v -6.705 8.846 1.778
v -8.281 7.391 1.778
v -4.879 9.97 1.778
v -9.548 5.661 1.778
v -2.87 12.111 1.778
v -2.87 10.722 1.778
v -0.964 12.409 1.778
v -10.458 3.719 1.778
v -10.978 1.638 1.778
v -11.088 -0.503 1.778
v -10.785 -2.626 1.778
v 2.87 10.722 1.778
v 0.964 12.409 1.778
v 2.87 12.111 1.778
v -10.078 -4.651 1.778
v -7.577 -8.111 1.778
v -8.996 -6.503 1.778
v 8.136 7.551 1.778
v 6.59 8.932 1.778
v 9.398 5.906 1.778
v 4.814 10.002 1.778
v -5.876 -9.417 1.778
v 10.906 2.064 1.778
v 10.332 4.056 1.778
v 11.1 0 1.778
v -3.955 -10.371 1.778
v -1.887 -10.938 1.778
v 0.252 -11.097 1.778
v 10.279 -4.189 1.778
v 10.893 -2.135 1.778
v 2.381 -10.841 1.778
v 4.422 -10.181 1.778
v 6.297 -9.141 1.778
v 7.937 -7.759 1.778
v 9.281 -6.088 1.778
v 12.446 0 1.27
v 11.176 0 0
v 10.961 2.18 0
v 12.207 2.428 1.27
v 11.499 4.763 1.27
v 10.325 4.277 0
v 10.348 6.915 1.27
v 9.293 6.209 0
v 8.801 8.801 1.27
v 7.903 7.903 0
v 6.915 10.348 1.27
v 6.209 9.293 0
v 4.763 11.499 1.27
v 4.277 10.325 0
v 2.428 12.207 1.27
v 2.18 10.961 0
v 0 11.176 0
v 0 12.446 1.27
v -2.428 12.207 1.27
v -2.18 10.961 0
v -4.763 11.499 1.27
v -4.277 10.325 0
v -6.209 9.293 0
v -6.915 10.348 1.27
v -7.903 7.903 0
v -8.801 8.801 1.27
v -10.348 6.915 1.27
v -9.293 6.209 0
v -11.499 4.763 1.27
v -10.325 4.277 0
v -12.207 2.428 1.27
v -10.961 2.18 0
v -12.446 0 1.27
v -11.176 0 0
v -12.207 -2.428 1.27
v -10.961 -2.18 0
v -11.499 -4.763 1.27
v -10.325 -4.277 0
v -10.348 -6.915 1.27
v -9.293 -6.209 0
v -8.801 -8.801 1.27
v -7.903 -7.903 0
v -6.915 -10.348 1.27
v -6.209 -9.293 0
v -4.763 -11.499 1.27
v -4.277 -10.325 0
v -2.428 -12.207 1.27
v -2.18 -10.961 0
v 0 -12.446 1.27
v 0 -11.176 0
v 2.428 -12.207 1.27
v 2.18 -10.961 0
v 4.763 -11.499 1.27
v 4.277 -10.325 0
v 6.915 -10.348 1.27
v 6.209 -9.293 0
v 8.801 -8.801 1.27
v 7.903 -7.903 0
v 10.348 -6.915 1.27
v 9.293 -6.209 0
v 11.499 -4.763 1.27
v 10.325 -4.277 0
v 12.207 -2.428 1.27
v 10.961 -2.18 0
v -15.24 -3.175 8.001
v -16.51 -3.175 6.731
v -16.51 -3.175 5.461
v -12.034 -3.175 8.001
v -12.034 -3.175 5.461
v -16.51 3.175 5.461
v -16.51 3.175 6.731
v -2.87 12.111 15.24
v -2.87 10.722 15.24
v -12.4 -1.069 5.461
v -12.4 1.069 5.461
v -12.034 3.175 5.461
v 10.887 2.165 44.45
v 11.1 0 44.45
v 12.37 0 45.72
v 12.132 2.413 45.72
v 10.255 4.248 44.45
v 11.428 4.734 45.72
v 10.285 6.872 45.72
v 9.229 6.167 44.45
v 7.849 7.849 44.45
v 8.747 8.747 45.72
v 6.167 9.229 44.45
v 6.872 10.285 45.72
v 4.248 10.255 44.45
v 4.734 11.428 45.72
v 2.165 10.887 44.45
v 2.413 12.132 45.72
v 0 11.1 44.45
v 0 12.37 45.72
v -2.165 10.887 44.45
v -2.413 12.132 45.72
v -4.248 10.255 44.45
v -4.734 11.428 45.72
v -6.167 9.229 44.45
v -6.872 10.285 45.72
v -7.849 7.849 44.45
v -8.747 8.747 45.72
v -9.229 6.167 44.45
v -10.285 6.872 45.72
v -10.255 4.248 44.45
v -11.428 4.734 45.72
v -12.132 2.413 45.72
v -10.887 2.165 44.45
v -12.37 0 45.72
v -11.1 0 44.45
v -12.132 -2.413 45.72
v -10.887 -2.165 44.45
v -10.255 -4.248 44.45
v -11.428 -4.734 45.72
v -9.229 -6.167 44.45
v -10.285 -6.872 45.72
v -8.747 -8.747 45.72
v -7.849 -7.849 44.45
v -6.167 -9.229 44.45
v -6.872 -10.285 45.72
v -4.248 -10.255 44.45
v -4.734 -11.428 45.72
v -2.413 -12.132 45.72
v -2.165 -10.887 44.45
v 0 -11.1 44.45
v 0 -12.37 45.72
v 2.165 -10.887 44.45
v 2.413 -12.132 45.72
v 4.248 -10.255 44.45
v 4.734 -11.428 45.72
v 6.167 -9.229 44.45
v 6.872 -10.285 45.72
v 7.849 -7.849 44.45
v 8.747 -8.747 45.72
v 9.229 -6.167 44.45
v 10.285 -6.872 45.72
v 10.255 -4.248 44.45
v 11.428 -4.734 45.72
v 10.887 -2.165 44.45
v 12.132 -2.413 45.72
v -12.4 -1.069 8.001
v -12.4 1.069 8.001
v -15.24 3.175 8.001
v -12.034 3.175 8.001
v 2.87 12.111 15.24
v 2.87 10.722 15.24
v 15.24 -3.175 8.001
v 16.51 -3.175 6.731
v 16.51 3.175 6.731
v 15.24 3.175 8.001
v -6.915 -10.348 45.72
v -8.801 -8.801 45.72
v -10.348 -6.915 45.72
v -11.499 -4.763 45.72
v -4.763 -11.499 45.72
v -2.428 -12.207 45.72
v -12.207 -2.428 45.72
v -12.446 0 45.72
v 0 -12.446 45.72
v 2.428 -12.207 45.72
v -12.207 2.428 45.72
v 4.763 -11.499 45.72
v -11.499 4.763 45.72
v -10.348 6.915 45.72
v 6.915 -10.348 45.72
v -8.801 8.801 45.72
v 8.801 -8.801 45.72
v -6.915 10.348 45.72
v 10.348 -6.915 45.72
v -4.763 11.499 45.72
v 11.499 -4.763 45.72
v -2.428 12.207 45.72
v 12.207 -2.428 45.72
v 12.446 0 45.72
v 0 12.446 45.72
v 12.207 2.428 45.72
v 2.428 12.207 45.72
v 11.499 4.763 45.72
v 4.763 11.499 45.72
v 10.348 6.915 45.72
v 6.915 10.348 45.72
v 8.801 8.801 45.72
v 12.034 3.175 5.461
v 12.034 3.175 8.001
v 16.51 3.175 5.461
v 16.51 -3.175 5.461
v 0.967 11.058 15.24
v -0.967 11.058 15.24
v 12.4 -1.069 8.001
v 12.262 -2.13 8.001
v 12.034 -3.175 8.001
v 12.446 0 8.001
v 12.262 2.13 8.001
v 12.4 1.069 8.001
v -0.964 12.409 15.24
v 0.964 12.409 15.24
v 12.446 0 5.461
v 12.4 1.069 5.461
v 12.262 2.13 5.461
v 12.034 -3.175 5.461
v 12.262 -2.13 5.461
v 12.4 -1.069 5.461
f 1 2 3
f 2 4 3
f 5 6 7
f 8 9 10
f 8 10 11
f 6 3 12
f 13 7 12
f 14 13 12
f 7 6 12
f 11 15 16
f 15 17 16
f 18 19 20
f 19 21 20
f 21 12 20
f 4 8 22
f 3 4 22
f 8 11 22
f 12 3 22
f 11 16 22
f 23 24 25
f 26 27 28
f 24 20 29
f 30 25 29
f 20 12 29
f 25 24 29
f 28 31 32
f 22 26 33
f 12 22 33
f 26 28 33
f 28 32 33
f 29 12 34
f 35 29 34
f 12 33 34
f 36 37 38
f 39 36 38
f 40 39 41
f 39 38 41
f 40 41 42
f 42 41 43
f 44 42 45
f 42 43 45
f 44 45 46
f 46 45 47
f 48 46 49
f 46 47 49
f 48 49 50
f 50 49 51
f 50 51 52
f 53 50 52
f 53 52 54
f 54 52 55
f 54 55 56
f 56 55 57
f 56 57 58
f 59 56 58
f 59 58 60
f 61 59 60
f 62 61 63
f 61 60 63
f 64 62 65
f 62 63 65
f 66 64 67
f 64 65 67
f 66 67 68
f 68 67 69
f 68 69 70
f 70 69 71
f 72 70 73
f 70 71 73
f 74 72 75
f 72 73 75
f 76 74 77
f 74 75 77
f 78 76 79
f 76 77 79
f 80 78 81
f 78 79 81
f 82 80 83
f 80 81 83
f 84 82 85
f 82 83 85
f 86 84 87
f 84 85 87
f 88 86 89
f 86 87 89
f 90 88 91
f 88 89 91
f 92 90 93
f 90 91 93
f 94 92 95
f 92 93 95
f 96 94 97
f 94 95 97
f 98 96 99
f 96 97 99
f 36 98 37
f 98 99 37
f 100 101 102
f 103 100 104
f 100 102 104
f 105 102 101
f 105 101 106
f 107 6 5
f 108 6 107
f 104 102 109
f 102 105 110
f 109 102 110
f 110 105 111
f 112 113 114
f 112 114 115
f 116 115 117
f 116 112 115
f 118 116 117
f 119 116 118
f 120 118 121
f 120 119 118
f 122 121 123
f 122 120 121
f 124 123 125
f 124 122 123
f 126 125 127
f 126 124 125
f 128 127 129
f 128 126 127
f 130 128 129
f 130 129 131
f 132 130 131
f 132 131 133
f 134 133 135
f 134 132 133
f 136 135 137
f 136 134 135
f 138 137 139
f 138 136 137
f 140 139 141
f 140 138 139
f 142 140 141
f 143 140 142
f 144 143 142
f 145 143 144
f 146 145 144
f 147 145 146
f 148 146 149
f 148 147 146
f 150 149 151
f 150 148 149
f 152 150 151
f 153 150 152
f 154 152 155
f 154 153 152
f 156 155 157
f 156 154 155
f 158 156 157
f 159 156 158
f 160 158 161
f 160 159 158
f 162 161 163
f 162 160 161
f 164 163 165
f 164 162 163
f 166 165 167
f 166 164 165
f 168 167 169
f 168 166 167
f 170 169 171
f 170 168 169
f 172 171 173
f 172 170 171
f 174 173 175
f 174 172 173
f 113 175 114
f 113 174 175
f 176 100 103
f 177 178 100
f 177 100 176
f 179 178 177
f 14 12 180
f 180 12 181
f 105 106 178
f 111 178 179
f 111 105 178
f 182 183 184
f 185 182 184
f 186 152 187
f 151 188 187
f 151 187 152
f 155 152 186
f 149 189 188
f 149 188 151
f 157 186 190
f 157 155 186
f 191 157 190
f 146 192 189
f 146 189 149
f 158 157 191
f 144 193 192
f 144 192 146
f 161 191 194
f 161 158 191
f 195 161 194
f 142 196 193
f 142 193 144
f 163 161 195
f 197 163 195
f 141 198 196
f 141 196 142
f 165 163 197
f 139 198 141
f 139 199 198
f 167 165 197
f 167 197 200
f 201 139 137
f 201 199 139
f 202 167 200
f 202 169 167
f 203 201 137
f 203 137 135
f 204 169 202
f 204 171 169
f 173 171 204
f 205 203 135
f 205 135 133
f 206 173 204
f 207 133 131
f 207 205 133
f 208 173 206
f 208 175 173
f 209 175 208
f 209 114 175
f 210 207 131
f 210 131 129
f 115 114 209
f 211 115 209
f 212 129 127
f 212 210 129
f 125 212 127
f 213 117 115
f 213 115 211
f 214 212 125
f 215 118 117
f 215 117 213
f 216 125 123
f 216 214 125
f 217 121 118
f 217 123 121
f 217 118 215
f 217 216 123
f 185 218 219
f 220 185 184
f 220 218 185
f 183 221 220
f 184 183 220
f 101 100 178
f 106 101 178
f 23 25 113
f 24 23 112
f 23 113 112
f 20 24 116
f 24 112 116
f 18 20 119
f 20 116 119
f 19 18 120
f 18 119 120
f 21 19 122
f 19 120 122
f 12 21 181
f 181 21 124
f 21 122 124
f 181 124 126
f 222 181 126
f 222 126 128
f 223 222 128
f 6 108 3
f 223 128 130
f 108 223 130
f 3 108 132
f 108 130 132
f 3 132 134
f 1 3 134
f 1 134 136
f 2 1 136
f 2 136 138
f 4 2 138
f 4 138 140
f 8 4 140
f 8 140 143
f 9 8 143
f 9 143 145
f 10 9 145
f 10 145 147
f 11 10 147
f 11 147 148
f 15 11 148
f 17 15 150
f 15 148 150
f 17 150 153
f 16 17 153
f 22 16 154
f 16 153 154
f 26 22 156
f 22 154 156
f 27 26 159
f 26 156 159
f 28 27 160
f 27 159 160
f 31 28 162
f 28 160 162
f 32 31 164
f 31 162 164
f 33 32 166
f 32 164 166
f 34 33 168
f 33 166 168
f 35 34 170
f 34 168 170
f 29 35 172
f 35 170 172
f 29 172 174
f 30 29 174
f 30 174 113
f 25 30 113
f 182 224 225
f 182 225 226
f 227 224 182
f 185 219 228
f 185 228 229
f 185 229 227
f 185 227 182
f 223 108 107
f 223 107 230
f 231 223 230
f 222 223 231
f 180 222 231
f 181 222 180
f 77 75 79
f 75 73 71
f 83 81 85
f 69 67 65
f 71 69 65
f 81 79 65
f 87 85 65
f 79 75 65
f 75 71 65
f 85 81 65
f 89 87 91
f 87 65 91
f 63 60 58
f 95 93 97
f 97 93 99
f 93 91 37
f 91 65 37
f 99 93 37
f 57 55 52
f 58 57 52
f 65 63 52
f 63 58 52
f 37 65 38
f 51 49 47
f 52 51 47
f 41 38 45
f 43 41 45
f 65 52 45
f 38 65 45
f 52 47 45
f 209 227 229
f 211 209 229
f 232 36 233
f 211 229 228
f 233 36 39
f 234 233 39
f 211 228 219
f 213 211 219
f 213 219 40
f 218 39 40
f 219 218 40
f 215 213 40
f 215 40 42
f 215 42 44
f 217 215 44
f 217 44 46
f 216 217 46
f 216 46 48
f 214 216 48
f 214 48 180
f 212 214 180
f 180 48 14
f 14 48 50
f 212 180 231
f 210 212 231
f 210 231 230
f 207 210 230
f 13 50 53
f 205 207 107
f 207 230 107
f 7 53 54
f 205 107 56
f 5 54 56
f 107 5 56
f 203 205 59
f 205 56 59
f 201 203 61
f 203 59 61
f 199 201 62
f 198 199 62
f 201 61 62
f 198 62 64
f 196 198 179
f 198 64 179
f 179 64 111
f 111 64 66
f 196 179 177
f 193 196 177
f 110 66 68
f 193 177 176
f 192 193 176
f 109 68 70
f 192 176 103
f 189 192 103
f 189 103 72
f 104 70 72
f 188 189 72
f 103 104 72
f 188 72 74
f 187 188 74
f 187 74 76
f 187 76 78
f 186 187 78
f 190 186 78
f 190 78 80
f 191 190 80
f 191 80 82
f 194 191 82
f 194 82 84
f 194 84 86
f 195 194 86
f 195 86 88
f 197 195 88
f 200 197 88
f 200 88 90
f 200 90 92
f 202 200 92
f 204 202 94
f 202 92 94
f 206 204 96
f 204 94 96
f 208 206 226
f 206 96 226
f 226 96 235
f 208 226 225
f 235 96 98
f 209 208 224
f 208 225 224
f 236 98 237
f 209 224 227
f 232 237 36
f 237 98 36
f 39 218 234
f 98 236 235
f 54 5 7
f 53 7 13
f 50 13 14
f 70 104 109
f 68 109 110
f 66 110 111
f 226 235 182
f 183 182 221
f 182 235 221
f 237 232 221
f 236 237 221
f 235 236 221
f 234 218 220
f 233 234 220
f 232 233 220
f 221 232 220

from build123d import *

# Parameters (mm, degrees)
F0_R     = 12.446
F1_DEPTH = 45.72
F3_W     = 33.02
F3_H     = 6.35
F4_DEPTH = 2.54
F5_R     = 11.0998
F6_DEPTH = 43.942
F7_W     = 5.7404
F7_H     = 13.462
F8_DEPTH = 25.4
F9_SIZE  = 1.27


with BuildPart() as f1:
    # F0 (on Top) → F1 (new body)
    with BuildSketch(Plane.XY):
        Circle(F0_R)
    extrude(amount=F1_DEPTH)

    # F3 (on offset) → F4 (join)
    with BuildSketch(Plane.XY.offset(5.461)):
        Rectangle(F3_W, F3_H)
    extrude(amount=F4_DEPTH)

    # F5 (on face) → F6 (cut)
    with BuildSketch(Plane.XY.offset(45.72)):
        Circle(F5_R)
    extrude(amount=-F6_DEPTH, mode=Mode.SUBTRACT)

    # F7 (on Front) → F8 (cut)
    with BuildSketch(Plane.XZ):
        with Locations((0, 8.509)):
            Rectangle(F7_W, F7_H)
    extrude(amount=-F8_DEPTH, mode=Mode.SUBTRACT)

    # F9
    f9_edges = [f1.edges().sort_by_distance(p)[0] for p in [
        (-12.446, 0, 0),
        (-16.51, 0, 8.001),
        (16.51, 0, 8.001),
        (-11.0998, 0, 45.72),
    ]]
    chamfer(f9_edges, length=F9_SIZE)


solid = f1.part
